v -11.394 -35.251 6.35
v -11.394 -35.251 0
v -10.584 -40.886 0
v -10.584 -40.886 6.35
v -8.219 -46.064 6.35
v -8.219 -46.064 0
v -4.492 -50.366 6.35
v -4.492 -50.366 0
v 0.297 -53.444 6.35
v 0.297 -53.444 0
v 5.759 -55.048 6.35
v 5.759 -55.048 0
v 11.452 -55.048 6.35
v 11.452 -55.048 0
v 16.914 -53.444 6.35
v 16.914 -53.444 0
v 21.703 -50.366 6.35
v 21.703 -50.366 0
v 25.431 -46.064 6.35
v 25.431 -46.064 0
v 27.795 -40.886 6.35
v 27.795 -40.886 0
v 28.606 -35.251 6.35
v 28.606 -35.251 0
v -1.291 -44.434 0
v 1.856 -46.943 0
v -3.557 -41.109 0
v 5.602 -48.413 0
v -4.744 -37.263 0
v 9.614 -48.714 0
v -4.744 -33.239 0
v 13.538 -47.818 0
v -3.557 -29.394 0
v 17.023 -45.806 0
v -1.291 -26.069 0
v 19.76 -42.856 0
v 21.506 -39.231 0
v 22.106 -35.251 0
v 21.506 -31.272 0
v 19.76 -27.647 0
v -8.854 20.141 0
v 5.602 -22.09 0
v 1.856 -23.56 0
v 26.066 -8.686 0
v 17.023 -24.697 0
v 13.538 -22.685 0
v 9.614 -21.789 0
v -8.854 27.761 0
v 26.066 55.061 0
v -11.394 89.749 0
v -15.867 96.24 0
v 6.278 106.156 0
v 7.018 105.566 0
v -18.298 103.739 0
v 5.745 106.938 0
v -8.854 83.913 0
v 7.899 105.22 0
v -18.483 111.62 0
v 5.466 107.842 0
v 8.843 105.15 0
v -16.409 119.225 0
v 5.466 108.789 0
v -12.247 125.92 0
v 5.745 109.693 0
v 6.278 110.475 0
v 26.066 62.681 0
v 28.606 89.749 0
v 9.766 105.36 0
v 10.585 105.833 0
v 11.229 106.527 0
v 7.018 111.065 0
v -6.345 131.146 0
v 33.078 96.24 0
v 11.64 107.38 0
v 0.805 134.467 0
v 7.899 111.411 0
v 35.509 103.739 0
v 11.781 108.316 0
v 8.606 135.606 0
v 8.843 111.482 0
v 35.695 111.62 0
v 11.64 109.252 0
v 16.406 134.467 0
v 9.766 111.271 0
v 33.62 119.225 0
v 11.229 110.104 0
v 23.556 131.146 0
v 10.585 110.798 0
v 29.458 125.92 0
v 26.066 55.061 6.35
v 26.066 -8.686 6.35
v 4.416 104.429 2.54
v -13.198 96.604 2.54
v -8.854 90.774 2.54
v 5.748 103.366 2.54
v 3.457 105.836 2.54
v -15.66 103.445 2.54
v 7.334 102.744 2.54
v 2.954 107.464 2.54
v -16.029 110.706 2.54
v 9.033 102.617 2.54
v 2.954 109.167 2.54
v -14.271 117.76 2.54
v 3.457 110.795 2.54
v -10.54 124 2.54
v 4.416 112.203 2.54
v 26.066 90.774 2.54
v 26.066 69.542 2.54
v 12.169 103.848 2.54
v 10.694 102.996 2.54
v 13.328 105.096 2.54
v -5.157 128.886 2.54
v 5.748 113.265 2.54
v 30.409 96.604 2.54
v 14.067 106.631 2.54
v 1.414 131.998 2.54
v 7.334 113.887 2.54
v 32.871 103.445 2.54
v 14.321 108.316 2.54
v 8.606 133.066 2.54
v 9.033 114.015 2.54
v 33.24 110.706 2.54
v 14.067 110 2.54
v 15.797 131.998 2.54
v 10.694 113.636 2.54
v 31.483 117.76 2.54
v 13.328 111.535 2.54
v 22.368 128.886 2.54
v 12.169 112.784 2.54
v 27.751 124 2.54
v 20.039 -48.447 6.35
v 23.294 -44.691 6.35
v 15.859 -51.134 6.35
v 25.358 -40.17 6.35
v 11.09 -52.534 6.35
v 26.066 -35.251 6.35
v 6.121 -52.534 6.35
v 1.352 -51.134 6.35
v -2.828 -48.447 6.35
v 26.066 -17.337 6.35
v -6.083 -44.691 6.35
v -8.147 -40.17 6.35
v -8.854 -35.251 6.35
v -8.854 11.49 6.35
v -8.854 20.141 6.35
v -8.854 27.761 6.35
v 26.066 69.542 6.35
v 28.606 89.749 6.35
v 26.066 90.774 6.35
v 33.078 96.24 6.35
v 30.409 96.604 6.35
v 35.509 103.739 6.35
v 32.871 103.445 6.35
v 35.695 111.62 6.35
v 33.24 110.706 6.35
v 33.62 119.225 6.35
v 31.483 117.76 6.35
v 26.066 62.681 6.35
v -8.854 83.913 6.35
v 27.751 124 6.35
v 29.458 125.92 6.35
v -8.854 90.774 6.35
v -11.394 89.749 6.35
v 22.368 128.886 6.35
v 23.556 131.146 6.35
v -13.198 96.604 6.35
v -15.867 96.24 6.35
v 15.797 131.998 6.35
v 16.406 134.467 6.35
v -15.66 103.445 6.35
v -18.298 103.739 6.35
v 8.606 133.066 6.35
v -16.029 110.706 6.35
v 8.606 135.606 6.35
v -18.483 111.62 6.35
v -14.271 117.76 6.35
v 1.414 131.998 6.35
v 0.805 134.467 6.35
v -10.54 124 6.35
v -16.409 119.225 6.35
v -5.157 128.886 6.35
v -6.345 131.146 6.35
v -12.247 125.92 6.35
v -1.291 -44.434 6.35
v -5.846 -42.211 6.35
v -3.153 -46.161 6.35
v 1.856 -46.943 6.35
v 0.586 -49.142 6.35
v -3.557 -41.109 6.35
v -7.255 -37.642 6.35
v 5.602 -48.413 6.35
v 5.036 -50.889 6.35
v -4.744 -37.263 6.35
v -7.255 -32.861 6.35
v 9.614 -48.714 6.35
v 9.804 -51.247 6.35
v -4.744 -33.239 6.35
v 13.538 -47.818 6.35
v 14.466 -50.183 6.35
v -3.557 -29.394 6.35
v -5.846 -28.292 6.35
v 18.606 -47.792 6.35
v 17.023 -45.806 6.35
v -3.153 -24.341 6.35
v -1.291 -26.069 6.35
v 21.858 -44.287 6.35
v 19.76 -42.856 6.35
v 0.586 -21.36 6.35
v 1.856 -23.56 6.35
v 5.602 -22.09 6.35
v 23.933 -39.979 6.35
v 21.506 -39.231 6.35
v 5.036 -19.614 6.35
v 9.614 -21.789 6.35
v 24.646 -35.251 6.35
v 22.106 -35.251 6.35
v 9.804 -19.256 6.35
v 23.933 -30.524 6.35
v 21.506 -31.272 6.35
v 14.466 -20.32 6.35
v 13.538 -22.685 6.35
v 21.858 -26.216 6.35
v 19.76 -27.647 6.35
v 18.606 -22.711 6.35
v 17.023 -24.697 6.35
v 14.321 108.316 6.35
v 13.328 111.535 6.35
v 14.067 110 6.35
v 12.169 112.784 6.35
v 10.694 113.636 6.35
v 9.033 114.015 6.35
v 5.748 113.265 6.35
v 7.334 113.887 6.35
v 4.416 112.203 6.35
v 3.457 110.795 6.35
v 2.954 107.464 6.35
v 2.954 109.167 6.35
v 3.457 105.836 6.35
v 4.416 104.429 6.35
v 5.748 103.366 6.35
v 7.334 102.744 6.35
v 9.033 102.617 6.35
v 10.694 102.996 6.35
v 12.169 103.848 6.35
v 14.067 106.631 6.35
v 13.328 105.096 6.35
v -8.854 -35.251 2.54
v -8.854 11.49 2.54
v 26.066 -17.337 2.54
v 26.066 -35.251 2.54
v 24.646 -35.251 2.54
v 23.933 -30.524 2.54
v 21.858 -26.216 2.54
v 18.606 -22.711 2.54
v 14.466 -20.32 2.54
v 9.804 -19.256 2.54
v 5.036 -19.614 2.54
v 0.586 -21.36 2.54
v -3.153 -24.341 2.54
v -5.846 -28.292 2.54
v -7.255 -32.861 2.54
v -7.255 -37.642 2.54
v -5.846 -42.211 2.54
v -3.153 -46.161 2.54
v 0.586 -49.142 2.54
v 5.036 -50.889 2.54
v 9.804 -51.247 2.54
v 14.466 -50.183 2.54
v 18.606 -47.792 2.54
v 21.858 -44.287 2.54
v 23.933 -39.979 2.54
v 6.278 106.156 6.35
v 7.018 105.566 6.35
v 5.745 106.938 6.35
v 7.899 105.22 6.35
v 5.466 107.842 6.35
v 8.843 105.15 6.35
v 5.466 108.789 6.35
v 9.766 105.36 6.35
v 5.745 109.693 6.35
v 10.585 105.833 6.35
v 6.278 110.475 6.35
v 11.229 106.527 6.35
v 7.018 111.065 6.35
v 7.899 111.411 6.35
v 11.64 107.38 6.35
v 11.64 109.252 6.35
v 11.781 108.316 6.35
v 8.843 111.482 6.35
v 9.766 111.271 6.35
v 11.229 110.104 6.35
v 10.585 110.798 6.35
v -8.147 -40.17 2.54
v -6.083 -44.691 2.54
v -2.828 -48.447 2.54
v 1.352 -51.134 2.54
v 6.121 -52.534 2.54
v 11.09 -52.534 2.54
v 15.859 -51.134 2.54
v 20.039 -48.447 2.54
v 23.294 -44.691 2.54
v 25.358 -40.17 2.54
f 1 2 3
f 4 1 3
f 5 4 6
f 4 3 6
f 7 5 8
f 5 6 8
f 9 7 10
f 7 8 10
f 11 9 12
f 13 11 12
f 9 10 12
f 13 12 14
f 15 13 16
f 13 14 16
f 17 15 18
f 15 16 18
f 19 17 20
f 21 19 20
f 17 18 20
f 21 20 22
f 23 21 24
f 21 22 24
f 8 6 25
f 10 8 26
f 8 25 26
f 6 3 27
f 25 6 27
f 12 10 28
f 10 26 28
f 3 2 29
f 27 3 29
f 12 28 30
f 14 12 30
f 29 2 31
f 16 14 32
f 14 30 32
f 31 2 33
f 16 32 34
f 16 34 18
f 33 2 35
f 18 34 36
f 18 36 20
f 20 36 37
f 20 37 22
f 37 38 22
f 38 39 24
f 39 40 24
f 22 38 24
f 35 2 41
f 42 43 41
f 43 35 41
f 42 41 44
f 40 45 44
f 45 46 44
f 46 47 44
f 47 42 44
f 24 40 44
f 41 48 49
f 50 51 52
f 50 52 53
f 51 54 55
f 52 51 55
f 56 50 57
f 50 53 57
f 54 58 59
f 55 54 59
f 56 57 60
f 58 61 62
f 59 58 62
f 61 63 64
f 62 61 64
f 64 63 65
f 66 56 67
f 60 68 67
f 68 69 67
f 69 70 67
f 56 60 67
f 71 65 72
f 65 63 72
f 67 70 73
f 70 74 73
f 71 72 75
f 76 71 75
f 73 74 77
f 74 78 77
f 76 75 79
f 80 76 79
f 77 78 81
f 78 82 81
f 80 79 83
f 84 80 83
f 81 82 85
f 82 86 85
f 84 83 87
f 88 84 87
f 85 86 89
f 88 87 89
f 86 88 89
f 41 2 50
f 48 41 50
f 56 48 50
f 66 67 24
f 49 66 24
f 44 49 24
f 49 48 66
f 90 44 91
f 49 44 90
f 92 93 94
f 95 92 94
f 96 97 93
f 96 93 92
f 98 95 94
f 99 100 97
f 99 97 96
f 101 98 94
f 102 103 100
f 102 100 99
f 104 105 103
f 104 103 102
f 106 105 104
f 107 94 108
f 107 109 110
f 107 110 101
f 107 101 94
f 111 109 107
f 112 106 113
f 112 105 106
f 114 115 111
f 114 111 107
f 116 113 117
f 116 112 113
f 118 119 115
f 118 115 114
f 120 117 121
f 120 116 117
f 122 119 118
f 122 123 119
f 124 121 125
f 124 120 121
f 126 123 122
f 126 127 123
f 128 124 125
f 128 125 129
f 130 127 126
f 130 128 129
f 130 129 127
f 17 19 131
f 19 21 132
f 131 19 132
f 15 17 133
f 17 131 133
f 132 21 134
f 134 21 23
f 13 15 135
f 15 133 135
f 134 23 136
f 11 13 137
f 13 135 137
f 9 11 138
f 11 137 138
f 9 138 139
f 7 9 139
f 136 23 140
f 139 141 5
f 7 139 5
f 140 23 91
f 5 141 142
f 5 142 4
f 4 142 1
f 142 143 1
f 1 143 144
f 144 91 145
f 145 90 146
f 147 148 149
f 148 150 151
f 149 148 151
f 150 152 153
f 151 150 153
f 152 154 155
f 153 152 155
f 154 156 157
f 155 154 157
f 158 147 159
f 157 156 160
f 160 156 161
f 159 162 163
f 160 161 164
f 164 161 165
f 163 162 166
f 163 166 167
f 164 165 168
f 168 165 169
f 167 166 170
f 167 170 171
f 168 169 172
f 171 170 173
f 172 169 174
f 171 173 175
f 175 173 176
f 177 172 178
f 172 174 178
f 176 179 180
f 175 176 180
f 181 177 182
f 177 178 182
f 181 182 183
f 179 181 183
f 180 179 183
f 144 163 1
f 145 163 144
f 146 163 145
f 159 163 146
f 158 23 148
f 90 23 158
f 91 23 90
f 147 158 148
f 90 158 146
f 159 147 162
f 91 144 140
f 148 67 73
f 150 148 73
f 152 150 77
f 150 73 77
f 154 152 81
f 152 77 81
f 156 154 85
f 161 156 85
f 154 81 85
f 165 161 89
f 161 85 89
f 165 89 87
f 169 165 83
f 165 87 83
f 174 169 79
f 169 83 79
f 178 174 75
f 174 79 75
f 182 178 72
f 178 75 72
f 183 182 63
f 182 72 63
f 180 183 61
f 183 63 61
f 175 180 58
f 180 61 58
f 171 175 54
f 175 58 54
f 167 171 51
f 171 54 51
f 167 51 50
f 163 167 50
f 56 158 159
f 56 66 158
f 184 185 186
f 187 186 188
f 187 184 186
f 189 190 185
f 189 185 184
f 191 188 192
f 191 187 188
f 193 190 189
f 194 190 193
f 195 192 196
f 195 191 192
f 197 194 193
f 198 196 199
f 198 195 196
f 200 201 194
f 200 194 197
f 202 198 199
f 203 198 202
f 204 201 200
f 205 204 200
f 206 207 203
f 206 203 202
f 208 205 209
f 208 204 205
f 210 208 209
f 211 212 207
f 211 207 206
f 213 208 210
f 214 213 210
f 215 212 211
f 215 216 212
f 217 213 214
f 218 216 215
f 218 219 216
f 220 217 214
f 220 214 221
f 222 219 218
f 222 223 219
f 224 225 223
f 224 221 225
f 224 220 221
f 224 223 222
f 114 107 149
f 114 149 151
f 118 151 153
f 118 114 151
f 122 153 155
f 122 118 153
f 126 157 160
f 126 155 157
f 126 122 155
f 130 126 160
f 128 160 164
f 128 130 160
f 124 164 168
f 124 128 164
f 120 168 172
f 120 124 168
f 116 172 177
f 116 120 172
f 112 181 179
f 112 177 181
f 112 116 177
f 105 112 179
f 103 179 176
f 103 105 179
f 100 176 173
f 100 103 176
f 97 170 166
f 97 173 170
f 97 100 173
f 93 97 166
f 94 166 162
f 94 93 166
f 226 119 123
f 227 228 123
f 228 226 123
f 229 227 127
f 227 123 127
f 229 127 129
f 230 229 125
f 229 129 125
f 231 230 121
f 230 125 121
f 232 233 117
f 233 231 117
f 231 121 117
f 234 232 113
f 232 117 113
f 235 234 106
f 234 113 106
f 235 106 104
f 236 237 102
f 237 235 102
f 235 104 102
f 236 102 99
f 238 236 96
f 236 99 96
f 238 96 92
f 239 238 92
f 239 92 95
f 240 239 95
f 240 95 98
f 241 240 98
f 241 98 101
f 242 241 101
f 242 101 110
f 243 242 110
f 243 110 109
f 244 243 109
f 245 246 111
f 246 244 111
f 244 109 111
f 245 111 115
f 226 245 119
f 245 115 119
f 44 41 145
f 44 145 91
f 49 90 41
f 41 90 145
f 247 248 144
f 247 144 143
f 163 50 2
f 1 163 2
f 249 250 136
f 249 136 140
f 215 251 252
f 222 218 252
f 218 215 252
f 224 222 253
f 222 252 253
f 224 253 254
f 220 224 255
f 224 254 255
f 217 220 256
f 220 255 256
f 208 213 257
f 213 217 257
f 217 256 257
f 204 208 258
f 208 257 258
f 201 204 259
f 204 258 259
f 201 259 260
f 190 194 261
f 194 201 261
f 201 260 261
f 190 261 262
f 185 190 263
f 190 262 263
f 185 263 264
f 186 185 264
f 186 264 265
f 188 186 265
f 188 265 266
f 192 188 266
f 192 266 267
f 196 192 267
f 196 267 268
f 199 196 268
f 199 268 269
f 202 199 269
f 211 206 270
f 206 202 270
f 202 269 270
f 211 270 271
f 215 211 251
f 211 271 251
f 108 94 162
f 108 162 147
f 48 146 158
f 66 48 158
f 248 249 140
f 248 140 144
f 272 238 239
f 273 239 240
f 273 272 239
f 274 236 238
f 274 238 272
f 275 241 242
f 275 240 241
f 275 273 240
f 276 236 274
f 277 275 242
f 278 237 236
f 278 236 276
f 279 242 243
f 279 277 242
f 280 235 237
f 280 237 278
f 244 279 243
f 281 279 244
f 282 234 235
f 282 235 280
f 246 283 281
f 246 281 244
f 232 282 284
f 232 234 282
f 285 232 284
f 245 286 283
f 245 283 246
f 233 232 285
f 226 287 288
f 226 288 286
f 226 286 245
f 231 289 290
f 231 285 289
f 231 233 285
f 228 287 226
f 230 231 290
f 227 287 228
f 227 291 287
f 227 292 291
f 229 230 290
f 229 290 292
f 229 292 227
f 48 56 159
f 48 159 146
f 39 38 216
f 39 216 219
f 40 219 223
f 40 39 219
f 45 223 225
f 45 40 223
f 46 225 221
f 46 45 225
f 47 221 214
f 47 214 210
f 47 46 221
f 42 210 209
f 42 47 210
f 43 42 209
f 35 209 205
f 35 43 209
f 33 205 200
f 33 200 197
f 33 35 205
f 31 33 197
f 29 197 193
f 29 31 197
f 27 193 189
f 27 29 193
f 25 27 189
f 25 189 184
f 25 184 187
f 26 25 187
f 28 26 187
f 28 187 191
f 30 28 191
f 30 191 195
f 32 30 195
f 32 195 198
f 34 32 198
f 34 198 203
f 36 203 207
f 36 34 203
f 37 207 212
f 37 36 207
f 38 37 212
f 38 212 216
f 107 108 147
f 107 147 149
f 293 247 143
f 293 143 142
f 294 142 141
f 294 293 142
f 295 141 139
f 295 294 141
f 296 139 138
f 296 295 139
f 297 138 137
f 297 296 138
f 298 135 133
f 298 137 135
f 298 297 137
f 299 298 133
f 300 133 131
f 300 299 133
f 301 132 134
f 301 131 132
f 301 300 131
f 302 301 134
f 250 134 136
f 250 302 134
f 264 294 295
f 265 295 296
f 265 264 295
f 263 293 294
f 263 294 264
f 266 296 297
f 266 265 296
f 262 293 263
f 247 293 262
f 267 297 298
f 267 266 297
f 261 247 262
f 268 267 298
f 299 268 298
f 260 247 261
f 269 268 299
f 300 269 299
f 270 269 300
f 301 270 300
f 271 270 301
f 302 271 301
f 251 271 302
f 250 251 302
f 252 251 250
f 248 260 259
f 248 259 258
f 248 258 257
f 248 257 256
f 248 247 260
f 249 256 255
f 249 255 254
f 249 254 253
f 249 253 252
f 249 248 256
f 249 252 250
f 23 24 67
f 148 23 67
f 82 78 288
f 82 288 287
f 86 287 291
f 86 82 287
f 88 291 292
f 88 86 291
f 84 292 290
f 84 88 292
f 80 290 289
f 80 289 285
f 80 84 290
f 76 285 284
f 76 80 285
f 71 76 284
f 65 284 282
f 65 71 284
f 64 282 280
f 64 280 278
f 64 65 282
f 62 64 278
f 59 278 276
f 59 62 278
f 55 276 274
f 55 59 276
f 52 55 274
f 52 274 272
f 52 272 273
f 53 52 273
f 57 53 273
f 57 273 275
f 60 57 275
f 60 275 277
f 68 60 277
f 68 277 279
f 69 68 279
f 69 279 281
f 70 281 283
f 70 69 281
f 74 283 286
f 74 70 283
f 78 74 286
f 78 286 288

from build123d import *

# Parameters (mm, degrees)
SKETCH1_R           = 13.5
SKETCH1_R_2         = 3.175
BOSS_EXTRUDE1_DEPTH = 6.35
SHELL1_T            = -2.54
BOSS_EXTRUDE2_DEPTH = 3.81
BOSS_EXTRUDE3_DEPTH = 3.81
CUT_EXTRUDE1_DEPTH  = 141.327742832


with BuildPart() as part:
    # Sketch1 → Boss-Extrude1 (new body)
    with BuildSketch(Plane.XY):
        with BuildLine():
            Line((-11.394392523, 89.748598131), (-11.394392523, -35.251401869))
            ThreePointArc((-11.394392523, -35.251401869), (8.605607477, -55.251401869), (28.605607477, -35.251401869))
            Line((28.605607477, -35.251401869), (28.605607477, 89.748598131))
            ThreePointArc((28.605607477, 89.748598131), (8.605607477, 135.605580593), (-11.394392523, 89.748598131))
        make_face()
        with Locations((8.605607477, -35.251401869)):
            Circle(SKETCH1_R, mode=Mode.SUBTRACT)
        with Locations((8.605607477, 108.315703391)):
            Circle(SKETCH1_R_2, mode=Mode.SUBTRACT)
    extrude(amount=BOSS_EXTRUDE1_DEPTH)

    # Shell1
    shell1_openings = [part.faces().sort_by_distance(p)[0] for p in [
        (8.605607477, 50.282735683, 6.35),
    ]]
    offset(amount=SHELL1_T, openings=shell1_openings, kind=Kind.INTERSECTION)

    # Sketch2 → Boss-Extrude2 (add)
    with BuildSketch(Plane.XY.offset(6.35)):
        Polygon((-8.854392523, 27.76139222), (26.065607477, 62.68139222), (26.065607477, 55.06139222), (-8.854392523, 20.14139222), align=None)
    extrude(amount=-BOSS_EXTRUDE2_DEPTH)

    # Sketch3 → Boss-Extrude3 (add)
    with BuildSketch(Plane.XY.offset(2.54)):
        Polygon((26.065607477, 62.68139222), (-8.854392523, 83.913349477), (-8.854392523, 90.774186309), (26.065607477, 69.542229051), align=None)
        Polygon((-8.854392523, 20.14139222), (26.065607477, -8.685765345), (26.065607477, -17.33689372), (-8.854392523, 11.490263845), align=None)
    extrude(amount=BOSS_EXTRUDE3_DEPTH)

    # Sketch4 → Cut-Extrude1 (cut, through all)
    with BuildSketch(Plane.XY.offset(2.54)):
        Polygon((-8.854392523, 27.76139222), (26.065607477, 62.68139222), (-8.854392523, 83.913349477), align=None)
        Polygon((-8.854392523, 20.14139222), (26.065607477, -8.685765345), (26.065607477, 55.06139222), align=None)
    extrude(amount=-CUT_EXTRUDE1_DEPTH, mode=Mode.SUBTRACT)


solid = part.part
